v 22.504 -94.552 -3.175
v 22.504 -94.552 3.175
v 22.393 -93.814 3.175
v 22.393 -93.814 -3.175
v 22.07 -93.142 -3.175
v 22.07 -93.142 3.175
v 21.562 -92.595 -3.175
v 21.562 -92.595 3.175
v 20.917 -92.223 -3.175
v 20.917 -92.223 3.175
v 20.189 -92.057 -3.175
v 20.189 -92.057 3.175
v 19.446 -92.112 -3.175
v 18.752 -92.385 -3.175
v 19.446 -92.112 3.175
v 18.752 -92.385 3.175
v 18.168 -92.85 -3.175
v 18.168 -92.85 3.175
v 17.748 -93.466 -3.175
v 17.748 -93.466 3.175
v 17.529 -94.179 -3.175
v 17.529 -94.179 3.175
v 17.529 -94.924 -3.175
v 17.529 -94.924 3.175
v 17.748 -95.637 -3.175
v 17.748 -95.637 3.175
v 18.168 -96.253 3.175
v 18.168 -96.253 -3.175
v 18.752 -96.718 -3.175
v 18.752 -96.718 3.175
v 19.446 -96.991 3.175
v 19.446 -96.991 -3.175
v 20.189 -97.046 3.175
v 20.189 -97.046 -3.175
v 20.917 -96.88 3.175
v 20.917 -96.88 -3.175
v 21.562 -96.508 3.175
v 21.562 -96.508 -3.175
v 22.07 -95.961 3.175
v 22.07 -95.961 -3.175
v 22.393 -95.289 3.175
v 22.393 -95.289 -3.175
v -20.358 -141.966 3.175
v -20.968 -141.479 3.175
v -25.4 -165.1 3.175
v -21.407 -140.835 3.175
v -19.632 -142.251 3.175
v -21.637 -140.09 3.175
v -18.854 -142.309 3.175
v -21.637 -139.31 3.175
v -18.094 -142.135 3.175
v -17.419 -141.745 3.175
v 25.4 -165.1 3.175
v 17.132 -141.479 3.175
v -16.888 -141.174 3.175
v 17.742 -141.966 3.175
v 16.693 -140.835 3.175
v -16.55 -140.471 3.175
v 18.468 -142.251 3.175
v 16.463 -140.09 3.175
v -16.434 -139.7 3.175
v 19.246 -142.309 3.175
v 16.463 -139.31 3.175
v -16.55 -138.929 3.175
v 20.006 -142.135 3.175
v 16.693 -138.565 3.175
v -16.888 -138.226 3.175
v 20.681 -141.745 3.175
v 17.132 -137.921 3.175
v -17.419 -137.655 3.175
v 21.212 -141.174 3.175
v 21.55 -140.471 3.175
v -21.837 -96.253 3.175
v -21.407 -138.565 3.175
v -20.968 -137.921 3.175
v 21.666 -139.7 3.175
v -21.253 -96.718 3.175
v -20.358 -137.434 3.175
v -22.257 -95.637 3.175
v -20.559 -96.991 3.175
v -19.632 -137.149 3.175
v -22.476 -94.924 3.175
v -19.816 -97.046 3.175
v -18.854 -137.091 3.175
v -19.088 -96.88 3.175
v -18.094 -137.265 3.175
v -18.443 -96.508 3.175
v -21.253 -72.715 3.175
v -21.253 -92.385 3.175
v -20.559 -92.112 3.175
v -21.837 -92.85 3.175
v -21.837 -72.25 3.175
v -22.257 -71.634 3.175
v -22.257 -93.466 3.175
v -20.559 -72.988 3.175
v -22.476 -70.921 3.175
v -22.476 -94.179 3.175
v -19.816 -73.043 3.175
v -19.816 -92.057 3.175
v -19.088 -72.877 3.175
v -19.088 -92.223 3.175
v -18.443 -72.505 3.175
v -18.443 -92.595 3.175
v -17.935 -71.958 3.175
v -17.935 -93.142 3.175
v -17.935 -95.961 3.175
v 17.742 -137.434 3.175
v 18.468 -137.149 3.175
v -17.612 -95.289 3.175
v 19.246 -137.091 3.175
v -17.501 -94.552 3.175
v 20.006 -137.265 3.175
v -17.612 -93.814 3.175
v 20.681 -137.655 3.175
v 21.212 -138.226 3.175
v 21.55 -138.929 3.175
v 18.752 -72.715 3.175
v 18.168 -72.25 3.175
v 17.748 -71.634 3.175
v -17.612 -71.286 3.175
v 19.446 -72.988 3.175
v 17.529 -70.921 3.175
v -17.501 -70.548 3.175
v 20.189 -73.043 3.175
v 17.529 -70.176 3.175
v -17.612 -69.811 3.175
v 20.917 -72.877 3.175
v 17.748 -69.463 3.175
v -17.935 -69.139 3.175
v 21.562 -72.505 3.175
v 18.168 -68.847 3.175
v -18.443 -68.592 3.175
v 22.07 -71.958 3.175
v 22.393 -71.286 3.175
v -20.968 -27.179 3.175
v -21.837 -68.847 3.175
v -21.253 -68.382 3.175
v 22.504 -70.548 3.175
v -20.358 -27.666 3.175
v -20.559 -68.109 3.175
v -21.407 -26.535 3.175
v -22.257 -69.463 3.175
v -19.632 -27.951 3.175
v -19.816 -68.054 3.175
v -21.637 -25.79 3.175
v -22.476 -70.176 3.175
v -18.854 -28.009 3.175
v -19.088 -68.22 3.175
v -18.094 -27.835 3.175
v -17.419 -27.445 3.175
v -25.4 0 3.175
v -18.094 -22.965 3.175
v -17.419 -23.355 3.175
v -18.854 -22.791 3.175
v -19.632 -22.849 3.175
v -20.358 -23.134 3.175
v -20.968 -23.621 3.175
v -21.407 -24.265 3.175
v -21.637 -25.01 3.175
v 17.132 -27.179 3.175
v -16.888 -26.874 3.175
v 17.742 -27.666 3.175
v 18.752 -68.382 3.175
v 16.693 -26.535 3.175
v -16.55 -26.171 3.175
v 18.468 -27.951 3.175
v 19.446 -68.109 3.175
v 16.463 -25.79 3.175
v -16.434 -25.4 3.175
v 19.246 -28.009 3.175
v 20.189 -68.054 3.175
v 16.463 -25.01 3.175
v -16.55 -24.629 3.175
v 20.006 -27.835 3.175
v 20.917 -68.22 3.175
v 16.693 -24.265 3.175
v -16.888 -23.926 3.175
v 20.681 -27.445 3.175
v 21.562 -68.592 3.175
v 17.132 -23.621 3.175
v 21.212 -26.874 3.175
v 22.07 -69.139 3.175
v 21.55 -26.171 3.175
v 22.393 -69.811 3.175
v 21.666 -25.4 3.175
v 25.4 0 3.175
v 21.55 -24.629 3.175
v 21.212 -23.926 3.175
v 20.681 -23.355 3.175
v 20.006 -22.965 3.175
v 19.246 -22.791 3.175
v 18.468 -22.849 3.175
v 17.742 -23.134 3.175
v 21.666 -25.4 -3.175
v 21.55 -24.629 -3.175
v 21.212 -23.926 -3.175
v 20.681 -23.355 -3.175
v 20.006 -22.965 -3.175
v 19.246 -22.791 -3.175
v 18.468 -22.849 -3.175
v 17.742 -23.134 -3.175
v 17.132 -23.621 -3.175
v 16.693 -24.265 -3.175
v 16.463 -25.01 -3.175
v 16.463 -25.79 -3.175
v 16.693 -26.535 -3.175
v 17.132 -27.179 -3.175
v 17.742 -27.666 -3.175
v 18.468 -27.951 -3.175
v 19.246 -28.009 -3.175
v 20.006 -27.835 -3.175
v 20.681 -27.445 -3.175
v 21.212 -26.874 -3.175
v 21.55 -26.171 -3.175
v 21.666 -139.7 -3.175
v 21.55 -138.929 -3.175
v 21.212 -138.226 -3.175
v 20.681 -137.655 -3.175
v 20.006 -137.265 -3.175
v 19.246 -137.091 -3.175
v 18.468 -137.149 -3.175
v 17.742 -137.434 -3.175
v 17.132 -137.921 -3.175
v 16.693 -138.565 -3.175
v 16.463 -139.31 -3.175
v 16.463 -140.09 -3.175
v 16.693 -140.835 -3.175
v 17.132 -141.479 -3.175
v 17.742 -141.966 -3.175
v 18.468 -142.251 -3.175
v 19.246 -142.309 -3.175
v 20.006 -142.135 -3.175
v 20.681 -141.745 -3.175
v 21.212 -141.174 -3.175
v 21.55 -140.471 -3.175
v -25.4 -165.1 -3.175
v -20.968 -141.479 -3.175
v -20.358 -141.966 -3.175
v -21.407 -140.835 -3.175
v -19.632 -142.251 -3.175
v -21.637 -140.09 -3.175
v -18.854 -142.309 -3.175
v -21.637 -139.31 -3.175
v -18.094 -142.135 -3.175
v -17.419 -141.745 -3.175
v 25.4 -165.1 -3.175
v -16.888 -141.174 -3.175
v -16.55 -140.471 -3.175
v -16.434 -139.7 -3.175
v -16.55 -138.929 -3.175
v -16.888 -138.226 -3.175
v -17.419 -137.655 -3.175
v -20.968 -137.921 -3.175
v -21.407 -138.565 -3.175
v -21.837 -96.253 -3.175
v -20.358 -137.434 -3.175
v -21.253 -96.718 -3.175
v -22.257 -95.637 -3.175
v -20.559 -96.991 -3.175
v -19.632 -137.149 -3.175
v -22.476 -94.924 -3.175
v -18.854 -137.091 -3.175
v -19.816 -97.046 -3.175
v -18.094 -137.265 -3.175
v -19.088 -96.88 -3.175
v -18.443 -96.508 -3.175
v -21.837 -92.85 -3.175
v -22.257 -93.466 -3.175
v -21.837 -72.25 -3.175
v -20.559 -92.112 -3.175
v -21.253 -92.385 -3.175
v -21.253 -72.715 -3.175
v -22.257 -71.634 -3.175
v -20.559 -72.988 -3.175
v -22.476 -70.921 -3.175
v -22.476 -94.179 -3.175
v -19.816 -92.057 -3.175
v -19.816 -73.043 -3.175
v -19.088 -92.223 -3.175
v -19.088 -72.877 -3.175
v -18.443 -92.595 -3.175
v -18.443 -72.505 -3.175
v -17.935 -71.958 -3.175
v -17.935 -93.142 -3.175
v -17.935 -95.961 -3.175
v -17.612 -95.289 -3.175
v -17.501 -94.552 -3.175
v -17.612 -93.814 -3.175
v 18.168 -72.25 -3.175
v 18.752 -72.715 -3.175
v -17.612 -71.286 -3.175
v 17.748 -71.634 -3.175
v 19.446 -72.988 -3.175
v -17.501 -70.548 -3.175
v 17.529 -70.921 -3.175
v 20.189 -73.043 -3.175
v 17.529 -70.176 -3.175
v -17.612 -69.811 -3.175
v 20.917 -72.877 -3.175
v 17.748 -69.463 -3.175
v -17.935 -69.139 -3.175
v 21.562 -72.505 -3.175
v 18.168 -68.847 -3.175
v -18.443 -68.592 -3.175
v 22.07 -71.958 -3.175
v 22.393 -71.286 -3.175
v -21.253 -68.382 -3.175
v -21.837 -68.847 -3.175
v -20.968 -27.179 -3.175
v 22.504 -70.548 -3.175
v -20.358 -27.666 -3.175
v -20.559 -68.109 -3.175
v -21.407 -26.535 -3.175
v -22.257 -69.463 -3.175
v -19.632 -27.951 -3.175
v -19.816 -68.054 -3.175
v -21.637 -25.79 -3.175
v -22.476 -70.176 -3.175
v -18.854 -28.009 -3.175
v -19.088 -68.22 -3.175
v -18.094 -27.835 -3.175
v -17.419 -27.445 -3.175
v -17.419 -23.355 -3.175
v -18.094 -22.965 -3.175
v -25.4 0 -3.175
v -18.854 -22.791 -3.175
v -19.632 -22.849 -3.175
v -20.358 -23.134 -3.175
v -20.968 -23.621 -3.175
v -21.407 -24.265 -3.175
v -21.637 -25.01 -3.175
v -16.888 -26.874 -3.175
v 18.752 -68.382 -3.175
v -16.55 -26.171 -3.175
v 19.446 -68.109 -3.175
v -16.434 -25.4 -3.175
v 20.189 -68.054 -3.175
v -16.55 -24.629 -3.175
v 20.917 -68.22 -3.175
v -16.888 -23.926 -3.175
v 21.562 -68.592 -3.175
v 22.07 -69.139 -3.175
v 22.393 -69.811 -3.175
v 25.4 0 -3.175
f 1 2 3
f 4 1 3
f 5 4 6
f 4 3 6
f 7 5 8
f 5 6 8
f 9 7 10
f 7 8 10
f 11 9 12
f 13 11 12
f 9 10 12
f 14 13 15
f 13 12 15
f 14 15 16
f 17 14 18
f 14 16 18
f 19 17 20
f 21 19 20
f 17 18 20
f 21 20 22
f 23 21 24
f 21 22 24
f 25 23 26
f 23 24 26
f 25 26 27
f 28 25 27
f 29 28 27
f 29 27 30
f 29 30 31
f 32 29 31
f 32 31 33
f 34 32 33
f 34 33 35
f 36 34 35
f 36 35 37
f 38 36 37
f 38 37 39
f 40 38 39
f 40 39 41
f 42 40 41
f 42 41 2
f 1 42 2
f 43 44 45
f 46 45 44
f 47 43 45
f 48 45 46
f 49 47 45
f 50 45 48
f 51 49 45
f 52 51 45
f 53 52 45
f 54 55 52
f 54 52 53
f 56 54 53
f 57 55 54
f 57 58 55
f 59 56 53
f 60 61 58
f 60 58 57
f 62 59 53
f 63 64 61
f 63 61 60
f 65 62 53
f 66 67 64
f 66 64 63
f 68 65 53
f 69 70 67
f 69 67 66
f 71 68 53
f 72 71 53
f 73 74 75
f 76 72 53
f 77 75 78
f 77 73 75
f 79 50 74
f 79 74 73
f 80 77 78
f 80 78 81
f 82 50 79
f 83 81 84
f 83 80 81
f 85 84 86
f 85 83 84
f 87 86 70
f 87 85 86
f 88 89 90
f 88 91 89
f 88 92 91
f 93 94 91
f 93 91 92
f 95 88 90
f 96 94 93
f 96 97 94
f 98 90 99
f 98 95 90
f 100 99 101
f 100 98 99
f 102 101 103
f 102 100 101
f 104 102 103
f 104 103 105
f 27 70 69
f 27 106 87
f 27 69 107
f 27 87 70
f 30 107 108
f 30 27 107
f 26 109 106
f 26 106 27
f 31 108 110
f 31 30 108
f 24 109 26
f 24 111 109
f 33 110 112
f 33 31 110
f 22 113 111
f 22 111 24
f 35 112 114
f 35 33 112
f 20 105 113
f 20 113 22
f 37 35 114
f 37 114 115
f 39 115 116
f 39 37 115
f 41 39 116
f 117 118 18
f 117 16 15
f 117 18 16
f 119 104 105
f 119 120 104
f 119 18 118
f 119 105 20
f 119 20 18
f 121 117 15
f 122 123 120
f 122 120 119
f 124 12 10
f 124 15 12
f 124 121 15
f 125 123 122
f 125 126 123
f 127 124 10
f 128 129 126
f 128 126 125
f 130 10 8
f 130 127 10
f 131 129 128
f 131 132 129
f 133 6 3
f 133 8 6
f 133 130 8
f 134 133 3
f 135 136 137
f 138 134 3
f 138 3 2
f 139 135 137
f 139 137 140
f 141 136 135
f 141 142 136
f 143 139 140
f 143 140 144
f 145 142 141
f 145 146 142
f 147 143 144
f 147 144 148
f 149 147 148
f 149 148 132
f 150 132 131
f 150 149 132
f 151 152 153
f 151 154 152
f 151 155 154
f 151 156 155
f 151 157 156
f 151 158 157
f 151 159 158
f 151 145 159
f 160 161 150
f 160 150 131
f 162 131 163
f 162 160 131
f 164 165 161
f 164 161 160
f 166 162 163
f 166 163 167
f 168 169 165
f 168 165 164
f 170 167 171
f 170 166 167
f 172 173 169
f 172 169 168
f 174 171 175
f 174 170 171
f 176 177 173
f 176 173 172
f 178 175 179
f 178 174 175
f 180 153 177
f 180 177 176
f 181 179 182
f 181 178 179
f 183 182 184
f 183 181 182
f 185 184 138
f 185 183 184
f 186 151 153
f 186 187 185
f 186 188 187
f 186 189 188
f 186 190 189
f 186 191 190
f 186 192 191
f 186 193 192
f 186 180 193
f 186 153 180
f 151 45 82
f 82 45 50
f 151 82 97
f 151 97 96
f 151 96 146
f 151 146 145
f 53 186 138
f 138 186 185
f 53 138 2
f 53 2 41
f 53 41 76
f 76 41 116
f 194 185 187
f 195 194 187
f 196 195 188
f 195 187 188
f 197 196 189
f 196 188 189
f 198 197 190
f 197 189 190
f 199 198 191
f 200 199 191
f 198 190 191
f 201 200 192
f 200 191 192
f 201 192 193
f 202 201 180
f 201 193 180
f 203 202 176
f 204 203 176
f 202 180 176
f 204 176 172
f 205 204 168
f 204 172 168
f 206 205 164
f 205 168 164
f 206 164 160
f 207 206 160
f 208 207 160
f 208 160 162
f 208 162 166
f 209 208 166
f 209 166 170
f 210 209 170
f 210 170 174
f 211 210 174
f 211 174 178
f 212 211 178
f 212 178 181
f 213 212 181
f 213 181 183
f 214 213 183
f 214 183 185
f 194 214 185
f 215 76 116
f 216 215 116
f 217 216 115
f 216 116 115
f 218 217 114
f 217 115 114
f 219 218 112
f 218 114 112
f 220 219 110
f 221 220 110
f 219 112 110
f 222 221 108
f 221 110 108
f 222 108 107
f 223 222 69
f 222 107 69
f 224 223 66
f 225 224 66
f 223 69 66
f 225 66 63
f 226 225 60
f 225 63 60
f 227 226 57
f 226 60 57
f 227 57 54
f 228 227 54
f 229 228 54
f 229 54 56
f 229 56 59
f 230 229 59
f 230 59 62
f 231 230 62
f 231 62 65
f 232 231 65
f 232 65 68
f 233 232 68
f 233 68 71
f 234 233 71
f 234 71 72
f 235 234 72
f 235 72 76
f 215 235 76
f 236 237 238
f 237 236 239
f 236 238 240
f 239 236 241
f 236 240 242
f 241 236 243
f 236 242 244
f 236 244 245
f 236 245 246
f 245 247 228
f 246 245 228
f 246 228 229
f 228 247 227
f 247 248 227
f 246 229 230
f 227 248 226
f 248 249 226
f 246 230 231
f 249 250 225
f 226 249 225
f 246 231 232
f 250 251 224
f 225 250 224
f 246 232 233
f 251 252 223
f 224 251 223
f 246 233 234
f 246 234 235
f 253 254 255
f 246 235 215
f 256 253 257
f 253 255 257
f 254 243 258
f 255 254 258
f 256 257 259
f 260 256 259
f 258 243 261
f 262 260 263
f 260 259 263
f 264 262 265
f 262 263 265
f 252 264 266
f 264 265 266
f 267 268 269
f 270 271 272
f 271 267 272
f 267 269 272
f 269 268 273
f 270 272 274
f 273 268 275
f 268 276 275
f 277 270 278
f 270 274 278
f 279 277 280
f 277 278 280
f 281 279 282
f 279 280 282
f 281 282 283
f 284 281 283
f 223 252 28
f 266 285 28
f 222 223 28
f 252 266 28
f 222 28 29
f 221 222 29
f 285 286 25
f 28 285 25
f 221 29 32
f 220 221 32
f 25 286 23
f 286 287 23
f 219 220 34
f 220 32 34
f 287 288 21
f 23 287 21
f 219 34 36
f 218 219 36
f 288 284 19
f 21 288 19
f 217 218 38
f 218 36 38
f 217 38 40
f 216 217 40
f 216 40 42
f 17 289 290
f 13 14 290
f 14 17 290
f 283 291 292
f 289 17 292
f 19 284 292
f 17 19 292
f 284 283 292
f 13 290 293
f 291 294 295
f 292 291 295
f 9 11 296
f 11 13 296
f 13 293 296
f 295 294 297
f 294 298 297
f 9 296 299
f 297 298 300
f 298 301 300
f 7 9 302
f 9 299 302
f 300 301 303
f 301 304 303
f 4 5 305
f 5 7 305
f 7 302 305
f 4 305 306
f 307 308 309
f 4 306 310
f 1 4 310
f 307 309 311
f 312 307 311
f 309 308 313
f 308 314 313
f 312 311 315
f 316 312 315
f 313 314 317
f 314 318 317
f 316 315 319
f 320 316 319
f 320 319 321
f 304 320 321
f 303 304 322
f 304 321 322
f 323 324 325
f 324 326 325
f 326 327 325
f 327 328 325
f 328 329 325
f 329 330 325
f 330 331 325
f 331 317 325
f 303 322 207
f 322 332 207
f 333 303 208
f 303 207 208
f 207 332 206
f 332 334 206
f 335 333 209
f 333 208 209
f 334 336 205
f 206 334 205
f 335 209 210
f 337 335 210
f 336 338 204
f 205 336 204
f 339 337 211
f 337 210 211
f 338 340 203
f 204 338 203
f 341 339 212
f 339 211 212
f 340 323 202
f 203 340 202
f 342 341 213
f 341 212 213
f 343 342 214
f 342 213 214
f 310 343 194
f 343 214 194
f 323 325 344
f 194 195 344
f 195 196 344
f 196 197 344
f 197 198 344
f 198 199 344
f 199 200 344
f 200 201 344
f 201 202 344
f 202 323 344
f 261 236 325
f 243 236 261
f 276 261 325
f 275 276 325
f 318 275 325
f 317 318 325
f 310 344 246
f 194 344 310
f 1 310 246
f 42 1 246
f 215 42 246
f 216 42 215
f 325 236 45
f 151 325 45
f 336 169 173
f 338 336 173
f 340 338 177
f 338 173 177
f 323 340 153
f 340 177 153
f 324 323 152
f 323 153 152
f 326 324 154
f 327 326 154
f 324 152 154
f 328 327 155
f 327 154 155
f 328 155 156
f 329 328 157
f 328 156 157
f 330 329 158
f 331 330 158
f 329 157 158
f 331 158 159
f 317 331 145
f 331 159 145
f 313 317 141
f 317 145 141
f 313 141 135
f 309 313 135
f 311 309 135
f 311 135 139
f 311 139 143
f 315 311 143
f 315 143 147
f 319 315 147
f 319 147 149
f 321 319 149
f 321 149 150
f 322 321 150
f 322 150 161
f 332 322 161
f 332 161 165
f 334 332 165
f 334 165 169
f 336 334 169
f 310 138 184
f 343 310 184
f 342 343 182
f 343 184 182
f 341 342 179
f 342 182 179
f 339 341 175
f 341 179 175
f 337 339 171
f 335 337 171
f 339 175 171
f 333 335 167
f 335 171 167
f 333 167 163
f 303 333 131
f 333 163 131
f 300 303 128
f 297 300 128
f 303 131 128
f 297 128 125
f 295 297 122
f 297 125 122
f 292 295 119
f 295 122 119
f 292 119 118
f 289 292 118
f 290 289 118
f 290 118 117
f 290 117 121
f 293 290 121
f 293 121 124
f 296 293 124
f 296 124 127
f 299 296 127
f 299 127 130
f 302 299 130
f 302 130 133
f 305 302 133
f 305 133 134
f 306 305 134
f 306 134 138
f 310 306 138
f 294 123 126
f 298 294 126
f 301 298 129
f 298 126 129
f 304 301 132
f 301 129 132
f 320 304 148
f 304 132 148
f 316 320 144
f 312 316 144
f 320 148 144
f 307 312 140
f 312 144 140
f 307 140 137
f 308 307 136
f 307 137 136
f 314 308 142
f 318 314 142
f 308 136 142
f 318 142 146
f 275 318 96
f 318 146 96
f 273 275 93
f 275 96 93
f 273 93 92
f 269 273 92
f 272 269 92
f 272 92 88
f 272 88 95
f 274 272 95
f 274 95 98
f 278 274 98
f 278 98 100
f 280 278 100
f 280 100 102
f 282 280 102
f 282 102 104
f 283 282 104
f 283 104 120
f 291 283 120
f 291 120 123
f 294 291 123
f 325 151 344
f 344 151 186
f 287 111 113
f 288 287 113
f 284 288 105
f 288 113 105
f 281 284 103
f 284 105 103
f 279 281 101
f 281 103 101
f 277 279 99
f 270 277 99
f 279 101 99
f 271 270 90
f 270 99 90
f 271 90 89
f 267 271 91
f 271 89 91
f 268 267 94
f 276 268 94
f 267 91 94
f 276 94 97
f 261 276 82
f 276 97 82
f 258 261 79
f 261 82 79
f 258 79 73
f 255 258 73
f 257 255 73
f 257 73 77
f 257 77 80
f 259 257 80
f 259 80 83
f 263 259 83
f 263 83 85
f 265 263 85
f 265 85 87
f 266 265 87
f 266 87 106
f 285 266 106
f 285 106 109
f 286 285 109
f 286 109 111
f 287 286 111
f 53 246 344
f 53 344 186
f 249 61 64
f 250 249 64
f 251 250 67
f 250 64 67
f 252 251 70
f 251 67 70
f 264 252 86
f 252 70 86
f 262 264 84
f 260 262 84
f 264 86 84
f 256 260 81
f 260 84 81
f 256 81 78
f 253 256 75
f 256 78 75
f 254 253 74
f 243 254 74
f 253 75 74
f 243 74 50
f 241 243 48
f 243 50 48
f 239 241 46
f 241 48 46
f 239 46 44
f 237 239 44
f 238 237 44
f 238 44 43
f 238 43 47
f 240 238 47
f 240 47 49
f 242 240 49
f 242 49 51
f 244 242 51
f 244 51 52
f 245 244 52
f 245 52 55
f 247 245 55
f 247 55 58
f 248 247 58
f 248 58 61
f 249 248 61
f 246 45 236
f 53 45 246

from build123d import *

# Parameters (mm, degrees)
F0_W     = 50.8
F0_H     = 6.35
F1_DEPTH = 165.1
F2_R     = 2.5019
F2_R_2   = 2.6162
F3_DEPTH = 6.351


with BuildPart() as f1:
    # F0 (on Front) → F1 (new body)
    with BuildSketch(Plane.XZ):
        Rectangle(F0_W, F0_H)
    extrude(amount=F1_DEPTH)

    # F2 (on face) → F3 (cut, through all)
    with BuildSketch(Plane.XY.offset(3.175)):
        with Locations((-20.0025, -94.5515)):
            Circle(F2_R)
        with Locations((20.0025, -94.5515)):
            Circle(F2_R)
        with Locations((20.0025, -70.5485)):
            Circle(F2_R)
        with Locations((-20.0025, -70.5485)):
            Circle(F2_R)
        with Locations((-19.05, -139.7)):
            Circle(F2_R_2)
        with Locations((19.05, -139.7)):
            Circle(F2_R_2)
        with Locations((-19.05, -25.4)):
            Circle(F2_R_2)
        with Locations((19.05, -25.4)):
            Circle(F2_R_2)
    extrude(amount=-F3_DEPTH, mode=Mode.SUBTRACT)


solid = f1.part
